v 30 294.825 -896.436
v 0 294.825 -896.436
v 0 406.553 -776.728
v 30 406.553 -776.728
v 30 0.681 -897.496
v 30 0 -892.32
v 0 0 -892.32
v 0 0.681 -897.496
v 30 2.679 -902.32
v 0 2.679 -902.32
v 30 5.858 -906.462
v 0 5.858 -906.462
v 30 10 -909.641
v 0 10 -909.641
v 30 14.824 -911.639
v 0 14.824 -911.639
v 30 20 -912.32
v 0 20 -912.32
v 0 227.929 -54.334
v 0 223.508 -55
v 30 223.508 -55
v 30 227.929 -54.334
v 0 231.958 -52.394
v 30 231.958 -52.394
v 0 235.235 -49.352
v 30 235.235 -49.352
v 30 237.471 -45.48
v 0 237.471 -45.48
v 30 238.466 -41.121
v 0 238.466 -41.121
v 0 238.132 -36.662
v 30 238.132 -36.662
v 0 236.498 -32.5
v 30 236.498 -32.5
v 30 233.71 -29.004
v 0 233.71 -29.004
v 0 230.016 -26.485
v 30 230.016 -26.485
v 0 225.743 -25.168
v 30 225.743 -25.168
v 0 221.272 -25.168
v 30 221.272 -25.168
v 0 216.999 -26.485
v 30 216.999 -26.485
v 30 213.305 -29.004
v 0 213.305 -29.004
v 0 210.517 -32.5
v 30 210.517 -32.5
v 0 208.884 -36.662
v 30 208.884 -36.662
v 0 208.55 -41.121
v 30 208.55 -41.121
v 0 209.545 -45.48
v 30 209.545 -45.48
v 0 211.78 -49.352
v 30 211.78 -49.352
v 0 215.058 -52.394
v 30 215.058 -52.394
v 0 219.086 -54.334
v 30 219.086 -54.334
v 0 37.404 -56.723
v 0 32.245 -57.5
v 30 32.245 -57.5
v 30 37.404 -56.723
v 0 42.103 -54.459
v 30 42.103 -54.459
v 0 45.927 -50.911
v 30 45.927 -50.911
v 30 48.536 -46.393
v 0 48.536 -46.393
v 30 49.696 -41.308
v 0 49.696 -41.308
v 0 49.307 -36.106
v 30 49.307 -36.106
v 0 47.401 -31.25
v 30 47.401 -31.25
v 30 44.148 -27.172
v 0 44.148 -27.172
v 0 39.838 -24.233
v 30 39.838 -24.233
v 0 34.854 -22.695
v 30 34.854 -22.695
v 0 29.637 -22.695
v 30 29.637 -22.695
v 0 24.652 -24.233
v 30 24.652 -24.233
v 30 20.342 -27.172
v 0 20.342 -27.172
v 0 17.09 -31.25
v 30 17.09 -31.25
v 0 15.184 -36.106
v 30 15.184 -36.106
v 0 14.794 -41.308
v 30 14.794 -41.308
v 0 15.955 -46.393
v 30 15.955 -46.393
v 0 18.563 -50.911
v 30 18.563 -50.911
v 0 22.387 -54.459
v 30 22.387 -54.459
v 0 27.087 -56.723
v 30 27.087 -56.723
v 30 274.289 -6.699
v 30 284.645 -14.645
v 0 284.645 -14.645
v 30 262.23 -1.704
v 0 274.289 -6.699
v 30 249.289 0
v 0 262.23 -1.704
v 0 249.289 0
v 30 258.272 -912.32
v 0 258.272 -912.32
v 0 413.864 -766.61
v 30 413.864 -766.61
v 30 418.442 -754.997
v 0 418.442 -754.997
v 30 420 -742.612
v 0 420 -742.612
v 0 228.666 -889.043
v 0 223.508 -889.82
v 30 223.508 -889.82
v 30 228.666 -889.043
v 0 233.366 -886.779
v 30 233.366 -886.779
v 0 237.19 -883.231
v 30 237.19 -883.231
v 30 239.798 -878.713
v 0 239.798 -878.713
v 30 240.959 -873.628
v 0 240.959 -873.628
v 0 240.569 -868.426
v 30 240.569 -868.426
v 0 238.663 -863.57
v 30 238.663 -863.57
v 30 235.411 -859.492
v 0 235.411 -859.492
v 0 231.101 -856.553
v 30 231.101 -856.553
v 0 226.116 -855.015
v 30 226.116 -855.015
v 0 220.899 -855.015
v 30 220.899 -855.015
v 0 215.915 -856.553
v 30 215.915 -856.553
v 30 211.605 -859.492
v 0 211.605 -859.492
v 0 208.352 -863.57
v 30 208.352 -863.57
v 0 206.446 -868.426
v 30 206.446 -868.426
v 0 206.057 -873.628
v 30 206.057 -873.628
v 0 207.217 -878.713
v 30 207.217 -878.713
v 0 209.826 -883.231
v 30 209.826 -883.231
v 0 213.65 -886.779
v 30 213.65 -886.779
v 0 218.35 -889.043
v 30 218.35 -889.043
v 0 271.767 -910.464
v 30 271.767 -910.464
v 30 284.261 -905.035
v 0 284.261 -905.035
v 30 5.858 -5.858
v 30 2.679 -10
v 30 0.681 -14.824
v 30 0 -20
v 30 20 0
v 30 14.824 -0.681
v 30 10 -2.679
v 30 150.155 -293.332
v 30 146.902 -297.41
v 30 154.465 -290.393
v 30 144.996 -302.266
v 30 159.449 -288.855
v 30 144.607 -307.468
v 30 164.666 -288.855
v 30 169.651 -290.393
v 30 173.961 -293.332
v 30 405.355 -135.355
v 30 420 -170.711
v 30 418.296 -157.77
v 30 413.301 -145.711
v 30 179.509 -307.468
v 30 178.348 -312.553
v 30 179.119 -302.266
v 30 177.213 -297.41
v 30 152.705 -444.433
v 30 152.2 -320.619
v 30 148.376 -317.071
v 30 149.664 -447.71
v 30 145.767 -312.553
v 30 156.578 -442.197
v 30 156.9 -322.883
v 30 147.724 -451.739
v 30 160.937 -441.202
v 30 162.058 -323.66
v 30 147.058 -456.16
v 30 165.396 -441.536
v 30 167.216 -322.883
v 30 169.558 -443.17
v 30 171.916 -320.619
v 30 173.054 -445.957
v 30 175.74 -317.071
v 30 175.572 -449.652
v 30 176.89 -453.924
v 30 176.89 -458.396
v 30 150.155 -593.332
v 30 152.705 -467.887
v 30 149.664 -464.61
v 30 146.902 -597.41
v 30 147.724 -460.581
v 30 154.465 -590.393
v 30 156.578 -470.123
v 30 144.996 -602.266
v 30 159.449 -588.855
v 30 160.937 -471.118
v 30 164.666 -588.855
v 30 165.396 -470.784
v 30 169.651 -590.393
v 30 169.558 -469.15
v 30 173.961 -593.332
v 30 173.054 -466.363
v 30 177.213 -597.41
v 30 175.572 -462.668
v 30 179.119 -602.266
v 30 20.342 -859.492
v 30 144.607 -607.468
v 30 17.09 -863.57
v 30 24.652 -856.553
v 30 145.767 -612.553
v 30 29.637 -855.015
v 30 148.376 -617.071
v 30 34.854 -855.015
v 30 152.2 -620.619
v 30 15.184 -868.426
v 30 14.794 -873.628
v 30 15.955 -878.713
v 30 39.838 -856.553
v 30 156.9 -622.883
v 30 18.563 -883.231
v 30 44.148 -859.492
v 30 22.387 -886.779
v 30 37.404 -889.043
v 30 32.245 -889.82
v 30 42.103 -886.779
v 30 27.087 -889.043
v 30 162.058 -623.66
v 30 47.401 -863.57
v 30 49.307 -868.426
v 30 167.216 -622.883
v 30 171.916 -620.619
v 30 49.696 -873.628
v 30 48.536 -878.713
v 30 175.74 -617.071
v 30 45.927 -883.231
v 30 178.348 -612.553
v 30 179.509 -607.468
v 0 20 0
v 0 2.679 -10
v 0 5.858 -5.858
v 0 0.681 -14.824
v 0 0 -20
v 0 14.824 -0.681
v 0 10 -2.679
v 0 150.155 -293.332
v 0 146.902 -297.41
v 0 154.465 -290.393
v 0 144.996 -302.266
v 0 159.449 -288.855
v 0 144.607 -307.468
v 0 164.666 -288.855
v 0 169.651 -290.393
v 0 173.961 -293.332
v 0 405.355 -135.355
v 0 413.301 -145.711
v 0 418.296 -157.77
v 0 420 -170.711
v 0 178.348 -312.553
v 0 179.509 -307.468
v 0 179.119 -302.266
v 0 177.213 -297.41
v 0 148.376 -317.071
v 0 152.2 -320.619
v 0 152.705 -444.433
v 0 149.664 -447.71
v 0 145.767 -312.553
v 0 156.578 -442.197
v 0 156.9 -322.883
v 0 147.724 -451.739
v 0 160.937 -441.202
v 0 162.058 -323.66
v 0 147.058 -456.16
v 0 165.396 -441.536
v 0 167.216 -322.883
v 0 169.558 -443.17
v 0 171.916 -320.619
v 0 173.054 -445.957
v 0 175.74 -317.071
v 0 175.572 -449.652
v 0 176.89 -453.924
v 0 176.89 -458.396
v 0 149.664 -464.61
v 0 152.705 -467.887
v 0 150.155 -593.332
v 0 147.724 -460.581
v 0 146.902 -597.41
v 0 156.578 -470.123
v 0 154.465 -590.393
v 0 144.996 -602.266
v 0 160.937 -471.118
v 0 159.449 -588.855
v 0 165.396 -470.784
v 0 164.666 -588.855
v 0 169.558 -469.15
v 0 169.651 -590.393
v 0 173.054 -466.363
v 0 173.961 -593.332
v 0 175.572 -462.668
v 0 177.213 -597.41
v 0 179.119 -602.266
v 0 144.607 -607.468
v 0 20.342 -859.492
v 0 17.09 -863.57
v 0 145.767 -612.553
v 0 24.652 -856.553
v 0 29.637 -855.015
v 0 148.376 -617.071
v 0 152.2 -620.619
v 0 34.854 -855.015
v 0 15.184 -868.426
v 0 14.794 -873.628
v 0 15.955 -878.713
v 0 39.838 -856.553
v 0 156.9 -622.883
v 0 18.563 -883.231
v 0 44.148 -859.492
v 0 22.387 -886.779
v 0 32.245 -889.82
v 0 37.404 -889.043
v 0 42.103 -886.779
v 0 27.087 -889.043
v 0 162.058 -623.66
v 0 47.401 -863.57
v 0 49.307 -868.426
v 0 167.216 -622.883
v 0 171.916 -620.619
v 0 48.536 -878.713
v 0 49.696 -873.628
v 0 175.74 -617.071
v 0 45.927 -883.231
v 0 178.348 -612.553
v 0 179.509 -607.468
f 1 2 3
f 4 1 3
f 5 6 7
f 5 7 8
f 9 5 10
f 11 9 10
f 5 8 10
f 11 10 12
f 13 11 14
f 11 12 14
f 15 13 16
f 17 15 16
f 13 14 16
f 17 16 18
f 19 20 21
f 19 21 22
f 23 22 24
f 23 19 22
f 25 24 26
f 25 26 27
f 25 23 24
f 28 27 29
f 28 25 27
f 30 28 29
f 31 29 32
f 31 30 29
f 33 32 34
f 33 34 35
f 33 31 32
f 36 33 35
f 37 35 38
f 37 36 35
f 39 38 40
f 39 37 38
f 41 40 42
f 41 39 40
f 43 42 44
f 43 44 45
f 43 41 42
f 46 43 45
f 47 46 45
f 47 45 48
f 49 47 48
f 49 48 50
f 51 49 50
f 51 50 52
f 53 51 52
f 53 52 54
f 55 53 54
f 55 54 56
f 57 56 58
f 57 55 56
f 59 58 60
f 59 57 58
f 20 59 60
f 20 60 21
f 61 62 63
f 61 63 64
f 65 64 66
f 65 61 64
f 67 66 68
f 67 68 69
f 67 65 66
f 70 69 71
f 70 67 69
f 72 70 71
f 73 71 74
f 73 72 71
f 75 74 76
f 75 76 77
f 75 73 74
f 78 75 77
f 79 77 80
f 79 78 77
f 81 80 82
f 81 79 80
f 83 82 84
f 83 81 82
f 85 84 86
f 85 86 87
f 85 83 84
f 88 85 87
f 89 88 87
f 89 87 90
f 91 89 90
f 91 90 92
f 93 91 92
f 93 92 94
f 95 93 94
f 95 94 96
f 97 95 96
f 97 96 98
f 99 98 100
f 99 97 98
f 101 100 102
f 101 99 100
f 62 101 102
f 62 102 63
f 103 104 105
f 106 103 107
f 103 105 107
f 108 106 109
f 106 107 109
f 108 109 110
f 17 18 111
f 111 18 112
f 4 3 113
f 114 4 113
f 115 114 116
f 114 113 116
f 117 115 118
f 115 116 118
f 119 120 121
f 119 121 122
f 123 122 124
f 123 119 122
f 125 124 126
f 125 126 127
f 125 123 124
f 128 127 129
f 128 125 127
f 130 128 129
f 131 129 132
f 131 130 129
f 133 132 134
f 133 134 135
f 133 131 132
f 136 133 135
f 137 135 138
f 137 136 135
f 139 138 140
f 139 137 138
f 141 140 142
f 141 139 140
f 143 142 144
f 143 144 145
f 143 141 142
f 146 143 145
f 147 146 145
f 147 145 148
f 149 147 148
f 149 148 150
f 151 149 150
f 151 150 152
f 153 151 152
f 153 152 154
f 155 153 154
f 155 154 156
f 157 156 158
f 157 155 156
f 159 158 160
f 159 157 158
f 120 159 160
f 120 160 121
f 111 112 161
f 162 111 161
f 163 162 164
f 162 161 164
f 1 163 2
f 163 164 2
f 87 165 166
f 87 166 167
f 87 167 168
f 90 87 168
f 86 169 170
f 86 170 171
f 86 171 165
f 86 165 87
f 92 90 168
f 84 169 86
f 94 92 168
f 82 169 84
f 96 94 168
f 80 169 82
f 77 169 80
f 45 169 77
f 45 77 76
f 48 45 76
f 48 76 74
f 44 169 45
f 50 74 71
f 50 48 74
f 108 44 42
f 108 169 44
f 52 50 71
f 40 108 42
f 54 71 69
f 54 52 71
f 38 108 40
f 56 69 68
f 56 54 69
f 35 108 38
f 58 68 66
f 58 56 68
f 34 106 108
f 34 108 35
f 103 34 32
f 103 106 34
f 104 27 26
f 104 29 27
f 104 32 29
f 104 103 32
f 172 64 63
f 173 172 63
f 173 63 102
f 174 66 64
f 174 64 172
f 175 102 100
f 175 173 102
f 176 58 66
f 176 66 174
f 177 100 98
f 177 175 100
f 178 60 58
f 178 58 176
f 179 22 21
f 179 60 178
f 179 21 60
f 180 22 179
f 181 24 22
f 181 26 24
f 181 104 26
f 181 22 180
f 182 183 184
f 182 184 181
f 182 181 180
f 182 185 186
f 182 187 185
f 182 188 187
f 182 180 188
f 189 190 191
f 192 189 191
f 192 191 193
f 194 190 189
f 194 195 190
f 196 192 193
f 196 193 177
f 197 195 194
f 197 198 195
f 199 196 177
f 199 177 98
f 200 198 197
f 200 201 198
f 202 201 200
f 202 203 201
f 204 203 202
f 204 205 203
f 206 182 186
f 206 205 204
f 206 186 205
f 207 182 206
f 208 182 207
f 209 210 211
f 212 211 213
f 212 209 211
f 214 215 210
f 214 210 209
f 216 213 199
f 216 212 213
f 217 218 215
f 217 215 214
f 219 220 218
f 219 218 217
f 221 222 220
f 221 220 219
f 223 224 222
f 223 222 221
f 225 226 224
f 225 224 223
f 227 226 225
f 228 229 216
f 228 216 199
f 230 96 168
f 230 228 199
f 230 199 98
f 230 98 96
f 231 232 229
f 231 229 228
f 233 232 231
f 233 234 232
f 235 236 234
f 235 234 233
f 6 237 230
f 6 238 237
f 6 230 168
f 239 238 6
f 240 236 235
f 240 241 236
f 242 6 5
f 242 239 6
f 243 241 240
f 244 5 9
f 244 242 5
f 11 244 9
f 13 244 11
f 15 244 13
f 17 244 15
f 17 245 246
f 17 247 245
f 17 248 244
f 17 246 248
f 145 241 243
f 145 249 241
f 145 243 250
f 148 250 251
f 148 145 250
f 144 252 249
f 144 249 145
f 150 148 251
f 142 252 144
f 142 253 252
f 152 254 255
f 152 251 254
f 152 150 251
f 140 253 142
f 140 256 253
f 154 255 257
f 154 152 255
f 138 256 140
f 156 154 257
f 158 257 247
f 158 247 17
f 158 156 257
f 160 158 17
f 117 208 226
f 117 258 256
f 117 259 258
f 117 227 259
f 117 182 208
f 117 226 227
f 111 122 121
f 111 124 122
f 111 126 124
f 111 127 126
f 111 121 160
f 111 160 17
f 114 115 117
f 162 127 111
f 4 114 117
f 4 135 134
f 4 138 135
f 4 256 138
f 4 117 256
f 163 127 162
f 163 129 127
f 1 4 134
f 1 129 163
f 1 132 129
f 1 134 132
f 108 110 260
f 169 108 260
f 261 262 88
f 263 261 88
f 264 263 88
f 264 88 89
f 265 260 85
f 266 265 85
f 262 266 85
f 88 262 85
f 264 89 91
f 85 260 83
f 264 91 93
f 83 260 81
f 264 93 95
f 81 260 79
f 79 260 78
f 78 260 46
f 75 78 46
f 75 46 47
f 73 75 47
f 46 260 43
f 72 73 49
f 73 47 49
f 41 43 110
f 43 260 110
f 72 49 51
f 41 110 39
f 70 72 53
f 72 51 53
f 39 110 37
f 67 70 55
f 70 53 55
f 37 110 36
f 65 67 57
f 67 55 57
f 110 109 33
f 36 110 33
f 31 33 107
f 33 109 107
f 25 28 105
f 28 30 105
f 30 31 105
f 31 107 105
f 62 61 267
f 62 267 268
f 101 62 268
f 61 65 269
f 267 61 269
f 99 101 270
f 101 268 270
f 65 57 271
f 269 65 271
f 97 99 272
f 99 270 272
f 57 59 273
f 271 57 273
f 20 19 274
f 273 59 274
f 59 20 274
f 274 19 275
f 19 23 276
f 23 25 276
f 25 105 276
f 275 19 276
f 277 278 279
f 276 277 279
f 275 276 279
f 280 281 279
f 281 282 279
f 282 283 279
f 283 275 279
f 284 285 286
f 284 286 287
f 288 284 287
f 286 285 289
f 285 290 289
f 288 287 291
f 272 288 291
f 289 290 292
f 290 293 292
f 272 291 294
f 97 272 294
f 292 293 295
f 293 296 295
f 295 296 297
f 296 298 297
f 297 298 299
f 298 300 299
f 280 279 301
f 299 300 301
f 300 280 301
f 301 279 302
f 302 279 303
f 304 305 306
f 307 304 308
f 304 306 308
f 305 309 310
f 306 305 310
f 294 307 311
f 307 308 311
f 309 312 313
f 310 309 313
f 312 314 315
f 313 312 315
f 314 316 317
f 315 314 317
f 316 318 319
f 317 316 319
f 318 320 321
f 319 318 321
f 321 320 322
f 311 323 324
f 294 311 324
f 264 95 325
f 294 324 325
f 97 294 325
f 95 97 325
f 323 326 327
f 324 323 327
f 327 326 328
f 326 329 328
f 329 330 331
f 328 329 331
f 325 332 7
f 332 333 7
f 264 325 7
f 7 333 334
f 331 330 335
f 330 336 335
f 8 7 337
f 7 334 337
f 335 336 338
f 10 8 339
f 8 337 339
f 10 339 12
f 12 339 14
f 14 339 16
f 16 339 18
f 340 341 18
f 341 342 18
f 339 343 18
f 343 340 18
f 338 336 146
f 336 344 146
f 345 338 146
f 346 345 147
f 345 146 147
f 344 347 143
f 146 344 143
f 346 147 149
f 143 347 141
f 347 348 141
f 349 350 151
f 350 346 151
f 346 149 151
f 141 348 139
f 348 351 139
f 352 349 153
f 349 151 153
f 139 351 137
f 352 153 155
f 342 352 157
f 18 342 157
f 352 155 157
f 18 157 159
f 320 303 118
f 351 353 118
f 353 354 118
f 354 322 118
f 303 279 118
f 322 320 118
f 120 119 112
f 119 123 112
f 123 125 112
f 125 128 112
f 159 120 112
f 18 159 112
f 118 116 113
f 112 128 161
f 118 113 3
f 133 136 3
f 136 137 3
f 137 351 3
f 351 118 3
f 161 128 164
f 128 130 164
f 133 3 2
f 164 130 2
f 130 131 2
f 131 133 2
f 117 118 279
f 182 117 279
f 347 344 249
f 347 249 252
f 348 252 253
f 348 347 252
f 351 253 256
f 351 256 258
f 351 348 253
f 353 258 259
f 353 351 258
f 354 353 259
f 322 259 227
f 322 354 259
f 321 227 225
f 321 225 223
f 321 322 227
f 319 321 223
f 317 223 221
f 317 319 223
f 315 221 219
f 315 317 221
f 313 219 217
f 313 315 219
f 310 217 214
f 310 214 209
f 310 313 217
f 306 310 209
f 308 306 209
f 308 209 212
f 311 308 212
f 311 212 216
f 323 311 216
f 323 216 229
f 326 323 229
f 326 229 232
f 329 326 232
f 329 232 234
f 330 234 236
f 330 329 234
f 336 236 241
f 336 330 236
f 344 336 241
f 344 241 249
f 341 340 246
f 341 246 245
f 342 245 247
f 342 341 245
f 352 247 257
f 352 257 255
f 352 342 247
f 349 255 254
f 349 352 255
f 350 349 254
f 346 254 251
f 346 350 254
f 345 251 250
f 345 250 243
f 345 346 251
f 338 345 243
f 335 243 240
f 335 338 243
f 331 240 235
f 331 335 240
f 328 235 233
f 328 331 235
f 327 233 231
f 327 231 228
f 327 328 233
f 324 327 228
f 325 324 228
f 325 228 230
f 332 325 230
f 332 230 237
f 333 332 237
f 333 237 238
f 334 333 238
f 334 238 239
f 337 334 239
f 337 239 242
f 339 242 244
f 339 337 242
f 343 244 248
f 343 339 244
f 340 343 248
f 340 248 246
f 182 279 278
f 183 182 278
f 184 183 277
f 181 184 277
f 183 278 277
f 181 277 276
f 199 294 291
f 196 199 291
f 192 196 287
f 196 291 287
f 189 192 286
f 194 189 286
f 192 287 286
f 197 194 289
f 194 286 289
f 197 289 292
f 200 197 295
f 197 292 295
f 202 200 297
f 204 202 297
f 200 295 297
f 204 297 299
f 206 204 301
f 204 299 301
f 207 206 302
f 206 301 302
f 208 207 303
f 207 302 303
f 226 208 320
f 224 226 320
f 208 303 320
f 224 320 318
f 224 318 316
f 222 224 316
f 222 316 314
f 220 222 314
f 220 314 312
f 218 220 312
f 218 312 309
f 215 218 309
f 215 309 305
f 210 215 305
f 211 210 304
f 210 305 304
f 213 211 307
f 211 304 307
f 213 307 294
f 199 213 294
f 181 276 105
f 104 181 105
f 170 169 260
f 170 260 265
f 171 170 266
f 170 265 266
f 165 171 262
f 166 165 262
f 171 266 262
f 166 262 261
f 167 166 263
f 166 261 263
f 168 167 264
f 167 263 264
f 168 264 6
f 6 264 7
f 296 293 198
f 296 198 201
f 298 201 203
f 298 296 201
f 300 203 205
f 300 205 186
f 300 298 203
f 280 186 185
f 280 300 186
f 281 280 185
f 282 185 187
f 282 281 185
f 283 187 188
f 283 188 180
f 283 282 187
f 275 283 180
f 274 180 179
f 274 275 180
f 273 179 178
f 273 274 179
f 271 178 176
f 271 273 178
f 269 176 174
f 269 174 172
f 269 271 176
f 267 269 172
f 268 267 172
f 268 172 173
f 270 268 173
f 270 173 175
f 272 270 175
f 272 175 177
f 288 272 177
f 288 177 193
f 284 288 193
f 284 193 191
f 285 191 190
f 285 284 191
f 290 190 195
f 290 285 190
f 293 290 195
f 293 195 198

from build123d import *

# Parameters (mm, degrees)
SKETCH1_R           = 17.5
SKETCH1_R_2         = 15
BOSS_EXTRUDE1_DEPTH = 30


with BuildPart() as part:
    # Sketch1 → Boss-Extrude1 (new body)
    with BuildSketch(Plane(origin=(0, 0, 0), x_dir=(0, 0, -1), z_dir=(1, 0, 0))):
        with BuildLine():
            Line((0, 249.289321881), (0, 20))
            ThreePointArc((0, 20), (5.857864376, 5.857864376), (20, 0))
            Line((20, 0), (456.16, 0))
            Line((456.16, 0), (892.32, 0))
            ThreePointArc((892.32, 0), (906.462135624, 5.857864376), (912.32, 20))
            Line((912.32, 20), (912.32, 258.272384904))
            ThreePointArc((912.32, 258.272384904), (908.177363781, 278.199807895), (896.435912518, 294.825148317))
            Line((896.435912518, 294.825148317), (776.727753487, 406.552763412))
            ThreePointArc((776.727753487, 406.552763412), (760.947077938, 416.516868825), (742.611840969, 420))
            Line((742.611840969, 420), (170.710678119, 420))
            ThreePointArc((170.710678119, 420), (151.5765065, 416.193976626), (135.355339059, 405.355339059))
            Line((135.355339059, 405.355339059), (14.644660941, 284.644660941))
            ThreePointArc((14.644660941, 284.644660941), (3.806023374, 268.4234935), (0, 249.289321881))
        make_face()
        with Locations((40, 32.245311268)):
            Circle(SKETCH1_R, mode=Mode.SUBTRACT)
        with Locations((872.32, 223.507722896)):
            Circle(SKETCH1_R, mode=Mode.SUBTRACT)
        with Locations((872.32, 32.245311268)):
            Circle(SKETCH1_R, mode=Mode.SUBTRACT)
        with Locations((606.16, 162.057722896)):
            Circle(SKETCH1_R, mode=Mode.SUBTRACT)
        with Locations((306.16, 162.057722896)):
            Circle(SKETCH1_R, mode=Mode.SUBTRACT)
        with BuildLine():
            ThreePointArc((456.16, 177.057722896), (471.16, 162.057722896), (456.16, 147.057722896))
            ThreePointArc((456.16, 147.057722896), (441.16, 162.057722896), (456.16, 177.057722896))
        make_face(mode=Mode.SUBTRACT)
        with Locations((40, 223.507722896)):
            Circle(SKETCH1_R_2, mode=Mode.SUBTRACT)
    extrude(amount=BOSS_EXTRUDE1_DEPTH)


solid = part.part
